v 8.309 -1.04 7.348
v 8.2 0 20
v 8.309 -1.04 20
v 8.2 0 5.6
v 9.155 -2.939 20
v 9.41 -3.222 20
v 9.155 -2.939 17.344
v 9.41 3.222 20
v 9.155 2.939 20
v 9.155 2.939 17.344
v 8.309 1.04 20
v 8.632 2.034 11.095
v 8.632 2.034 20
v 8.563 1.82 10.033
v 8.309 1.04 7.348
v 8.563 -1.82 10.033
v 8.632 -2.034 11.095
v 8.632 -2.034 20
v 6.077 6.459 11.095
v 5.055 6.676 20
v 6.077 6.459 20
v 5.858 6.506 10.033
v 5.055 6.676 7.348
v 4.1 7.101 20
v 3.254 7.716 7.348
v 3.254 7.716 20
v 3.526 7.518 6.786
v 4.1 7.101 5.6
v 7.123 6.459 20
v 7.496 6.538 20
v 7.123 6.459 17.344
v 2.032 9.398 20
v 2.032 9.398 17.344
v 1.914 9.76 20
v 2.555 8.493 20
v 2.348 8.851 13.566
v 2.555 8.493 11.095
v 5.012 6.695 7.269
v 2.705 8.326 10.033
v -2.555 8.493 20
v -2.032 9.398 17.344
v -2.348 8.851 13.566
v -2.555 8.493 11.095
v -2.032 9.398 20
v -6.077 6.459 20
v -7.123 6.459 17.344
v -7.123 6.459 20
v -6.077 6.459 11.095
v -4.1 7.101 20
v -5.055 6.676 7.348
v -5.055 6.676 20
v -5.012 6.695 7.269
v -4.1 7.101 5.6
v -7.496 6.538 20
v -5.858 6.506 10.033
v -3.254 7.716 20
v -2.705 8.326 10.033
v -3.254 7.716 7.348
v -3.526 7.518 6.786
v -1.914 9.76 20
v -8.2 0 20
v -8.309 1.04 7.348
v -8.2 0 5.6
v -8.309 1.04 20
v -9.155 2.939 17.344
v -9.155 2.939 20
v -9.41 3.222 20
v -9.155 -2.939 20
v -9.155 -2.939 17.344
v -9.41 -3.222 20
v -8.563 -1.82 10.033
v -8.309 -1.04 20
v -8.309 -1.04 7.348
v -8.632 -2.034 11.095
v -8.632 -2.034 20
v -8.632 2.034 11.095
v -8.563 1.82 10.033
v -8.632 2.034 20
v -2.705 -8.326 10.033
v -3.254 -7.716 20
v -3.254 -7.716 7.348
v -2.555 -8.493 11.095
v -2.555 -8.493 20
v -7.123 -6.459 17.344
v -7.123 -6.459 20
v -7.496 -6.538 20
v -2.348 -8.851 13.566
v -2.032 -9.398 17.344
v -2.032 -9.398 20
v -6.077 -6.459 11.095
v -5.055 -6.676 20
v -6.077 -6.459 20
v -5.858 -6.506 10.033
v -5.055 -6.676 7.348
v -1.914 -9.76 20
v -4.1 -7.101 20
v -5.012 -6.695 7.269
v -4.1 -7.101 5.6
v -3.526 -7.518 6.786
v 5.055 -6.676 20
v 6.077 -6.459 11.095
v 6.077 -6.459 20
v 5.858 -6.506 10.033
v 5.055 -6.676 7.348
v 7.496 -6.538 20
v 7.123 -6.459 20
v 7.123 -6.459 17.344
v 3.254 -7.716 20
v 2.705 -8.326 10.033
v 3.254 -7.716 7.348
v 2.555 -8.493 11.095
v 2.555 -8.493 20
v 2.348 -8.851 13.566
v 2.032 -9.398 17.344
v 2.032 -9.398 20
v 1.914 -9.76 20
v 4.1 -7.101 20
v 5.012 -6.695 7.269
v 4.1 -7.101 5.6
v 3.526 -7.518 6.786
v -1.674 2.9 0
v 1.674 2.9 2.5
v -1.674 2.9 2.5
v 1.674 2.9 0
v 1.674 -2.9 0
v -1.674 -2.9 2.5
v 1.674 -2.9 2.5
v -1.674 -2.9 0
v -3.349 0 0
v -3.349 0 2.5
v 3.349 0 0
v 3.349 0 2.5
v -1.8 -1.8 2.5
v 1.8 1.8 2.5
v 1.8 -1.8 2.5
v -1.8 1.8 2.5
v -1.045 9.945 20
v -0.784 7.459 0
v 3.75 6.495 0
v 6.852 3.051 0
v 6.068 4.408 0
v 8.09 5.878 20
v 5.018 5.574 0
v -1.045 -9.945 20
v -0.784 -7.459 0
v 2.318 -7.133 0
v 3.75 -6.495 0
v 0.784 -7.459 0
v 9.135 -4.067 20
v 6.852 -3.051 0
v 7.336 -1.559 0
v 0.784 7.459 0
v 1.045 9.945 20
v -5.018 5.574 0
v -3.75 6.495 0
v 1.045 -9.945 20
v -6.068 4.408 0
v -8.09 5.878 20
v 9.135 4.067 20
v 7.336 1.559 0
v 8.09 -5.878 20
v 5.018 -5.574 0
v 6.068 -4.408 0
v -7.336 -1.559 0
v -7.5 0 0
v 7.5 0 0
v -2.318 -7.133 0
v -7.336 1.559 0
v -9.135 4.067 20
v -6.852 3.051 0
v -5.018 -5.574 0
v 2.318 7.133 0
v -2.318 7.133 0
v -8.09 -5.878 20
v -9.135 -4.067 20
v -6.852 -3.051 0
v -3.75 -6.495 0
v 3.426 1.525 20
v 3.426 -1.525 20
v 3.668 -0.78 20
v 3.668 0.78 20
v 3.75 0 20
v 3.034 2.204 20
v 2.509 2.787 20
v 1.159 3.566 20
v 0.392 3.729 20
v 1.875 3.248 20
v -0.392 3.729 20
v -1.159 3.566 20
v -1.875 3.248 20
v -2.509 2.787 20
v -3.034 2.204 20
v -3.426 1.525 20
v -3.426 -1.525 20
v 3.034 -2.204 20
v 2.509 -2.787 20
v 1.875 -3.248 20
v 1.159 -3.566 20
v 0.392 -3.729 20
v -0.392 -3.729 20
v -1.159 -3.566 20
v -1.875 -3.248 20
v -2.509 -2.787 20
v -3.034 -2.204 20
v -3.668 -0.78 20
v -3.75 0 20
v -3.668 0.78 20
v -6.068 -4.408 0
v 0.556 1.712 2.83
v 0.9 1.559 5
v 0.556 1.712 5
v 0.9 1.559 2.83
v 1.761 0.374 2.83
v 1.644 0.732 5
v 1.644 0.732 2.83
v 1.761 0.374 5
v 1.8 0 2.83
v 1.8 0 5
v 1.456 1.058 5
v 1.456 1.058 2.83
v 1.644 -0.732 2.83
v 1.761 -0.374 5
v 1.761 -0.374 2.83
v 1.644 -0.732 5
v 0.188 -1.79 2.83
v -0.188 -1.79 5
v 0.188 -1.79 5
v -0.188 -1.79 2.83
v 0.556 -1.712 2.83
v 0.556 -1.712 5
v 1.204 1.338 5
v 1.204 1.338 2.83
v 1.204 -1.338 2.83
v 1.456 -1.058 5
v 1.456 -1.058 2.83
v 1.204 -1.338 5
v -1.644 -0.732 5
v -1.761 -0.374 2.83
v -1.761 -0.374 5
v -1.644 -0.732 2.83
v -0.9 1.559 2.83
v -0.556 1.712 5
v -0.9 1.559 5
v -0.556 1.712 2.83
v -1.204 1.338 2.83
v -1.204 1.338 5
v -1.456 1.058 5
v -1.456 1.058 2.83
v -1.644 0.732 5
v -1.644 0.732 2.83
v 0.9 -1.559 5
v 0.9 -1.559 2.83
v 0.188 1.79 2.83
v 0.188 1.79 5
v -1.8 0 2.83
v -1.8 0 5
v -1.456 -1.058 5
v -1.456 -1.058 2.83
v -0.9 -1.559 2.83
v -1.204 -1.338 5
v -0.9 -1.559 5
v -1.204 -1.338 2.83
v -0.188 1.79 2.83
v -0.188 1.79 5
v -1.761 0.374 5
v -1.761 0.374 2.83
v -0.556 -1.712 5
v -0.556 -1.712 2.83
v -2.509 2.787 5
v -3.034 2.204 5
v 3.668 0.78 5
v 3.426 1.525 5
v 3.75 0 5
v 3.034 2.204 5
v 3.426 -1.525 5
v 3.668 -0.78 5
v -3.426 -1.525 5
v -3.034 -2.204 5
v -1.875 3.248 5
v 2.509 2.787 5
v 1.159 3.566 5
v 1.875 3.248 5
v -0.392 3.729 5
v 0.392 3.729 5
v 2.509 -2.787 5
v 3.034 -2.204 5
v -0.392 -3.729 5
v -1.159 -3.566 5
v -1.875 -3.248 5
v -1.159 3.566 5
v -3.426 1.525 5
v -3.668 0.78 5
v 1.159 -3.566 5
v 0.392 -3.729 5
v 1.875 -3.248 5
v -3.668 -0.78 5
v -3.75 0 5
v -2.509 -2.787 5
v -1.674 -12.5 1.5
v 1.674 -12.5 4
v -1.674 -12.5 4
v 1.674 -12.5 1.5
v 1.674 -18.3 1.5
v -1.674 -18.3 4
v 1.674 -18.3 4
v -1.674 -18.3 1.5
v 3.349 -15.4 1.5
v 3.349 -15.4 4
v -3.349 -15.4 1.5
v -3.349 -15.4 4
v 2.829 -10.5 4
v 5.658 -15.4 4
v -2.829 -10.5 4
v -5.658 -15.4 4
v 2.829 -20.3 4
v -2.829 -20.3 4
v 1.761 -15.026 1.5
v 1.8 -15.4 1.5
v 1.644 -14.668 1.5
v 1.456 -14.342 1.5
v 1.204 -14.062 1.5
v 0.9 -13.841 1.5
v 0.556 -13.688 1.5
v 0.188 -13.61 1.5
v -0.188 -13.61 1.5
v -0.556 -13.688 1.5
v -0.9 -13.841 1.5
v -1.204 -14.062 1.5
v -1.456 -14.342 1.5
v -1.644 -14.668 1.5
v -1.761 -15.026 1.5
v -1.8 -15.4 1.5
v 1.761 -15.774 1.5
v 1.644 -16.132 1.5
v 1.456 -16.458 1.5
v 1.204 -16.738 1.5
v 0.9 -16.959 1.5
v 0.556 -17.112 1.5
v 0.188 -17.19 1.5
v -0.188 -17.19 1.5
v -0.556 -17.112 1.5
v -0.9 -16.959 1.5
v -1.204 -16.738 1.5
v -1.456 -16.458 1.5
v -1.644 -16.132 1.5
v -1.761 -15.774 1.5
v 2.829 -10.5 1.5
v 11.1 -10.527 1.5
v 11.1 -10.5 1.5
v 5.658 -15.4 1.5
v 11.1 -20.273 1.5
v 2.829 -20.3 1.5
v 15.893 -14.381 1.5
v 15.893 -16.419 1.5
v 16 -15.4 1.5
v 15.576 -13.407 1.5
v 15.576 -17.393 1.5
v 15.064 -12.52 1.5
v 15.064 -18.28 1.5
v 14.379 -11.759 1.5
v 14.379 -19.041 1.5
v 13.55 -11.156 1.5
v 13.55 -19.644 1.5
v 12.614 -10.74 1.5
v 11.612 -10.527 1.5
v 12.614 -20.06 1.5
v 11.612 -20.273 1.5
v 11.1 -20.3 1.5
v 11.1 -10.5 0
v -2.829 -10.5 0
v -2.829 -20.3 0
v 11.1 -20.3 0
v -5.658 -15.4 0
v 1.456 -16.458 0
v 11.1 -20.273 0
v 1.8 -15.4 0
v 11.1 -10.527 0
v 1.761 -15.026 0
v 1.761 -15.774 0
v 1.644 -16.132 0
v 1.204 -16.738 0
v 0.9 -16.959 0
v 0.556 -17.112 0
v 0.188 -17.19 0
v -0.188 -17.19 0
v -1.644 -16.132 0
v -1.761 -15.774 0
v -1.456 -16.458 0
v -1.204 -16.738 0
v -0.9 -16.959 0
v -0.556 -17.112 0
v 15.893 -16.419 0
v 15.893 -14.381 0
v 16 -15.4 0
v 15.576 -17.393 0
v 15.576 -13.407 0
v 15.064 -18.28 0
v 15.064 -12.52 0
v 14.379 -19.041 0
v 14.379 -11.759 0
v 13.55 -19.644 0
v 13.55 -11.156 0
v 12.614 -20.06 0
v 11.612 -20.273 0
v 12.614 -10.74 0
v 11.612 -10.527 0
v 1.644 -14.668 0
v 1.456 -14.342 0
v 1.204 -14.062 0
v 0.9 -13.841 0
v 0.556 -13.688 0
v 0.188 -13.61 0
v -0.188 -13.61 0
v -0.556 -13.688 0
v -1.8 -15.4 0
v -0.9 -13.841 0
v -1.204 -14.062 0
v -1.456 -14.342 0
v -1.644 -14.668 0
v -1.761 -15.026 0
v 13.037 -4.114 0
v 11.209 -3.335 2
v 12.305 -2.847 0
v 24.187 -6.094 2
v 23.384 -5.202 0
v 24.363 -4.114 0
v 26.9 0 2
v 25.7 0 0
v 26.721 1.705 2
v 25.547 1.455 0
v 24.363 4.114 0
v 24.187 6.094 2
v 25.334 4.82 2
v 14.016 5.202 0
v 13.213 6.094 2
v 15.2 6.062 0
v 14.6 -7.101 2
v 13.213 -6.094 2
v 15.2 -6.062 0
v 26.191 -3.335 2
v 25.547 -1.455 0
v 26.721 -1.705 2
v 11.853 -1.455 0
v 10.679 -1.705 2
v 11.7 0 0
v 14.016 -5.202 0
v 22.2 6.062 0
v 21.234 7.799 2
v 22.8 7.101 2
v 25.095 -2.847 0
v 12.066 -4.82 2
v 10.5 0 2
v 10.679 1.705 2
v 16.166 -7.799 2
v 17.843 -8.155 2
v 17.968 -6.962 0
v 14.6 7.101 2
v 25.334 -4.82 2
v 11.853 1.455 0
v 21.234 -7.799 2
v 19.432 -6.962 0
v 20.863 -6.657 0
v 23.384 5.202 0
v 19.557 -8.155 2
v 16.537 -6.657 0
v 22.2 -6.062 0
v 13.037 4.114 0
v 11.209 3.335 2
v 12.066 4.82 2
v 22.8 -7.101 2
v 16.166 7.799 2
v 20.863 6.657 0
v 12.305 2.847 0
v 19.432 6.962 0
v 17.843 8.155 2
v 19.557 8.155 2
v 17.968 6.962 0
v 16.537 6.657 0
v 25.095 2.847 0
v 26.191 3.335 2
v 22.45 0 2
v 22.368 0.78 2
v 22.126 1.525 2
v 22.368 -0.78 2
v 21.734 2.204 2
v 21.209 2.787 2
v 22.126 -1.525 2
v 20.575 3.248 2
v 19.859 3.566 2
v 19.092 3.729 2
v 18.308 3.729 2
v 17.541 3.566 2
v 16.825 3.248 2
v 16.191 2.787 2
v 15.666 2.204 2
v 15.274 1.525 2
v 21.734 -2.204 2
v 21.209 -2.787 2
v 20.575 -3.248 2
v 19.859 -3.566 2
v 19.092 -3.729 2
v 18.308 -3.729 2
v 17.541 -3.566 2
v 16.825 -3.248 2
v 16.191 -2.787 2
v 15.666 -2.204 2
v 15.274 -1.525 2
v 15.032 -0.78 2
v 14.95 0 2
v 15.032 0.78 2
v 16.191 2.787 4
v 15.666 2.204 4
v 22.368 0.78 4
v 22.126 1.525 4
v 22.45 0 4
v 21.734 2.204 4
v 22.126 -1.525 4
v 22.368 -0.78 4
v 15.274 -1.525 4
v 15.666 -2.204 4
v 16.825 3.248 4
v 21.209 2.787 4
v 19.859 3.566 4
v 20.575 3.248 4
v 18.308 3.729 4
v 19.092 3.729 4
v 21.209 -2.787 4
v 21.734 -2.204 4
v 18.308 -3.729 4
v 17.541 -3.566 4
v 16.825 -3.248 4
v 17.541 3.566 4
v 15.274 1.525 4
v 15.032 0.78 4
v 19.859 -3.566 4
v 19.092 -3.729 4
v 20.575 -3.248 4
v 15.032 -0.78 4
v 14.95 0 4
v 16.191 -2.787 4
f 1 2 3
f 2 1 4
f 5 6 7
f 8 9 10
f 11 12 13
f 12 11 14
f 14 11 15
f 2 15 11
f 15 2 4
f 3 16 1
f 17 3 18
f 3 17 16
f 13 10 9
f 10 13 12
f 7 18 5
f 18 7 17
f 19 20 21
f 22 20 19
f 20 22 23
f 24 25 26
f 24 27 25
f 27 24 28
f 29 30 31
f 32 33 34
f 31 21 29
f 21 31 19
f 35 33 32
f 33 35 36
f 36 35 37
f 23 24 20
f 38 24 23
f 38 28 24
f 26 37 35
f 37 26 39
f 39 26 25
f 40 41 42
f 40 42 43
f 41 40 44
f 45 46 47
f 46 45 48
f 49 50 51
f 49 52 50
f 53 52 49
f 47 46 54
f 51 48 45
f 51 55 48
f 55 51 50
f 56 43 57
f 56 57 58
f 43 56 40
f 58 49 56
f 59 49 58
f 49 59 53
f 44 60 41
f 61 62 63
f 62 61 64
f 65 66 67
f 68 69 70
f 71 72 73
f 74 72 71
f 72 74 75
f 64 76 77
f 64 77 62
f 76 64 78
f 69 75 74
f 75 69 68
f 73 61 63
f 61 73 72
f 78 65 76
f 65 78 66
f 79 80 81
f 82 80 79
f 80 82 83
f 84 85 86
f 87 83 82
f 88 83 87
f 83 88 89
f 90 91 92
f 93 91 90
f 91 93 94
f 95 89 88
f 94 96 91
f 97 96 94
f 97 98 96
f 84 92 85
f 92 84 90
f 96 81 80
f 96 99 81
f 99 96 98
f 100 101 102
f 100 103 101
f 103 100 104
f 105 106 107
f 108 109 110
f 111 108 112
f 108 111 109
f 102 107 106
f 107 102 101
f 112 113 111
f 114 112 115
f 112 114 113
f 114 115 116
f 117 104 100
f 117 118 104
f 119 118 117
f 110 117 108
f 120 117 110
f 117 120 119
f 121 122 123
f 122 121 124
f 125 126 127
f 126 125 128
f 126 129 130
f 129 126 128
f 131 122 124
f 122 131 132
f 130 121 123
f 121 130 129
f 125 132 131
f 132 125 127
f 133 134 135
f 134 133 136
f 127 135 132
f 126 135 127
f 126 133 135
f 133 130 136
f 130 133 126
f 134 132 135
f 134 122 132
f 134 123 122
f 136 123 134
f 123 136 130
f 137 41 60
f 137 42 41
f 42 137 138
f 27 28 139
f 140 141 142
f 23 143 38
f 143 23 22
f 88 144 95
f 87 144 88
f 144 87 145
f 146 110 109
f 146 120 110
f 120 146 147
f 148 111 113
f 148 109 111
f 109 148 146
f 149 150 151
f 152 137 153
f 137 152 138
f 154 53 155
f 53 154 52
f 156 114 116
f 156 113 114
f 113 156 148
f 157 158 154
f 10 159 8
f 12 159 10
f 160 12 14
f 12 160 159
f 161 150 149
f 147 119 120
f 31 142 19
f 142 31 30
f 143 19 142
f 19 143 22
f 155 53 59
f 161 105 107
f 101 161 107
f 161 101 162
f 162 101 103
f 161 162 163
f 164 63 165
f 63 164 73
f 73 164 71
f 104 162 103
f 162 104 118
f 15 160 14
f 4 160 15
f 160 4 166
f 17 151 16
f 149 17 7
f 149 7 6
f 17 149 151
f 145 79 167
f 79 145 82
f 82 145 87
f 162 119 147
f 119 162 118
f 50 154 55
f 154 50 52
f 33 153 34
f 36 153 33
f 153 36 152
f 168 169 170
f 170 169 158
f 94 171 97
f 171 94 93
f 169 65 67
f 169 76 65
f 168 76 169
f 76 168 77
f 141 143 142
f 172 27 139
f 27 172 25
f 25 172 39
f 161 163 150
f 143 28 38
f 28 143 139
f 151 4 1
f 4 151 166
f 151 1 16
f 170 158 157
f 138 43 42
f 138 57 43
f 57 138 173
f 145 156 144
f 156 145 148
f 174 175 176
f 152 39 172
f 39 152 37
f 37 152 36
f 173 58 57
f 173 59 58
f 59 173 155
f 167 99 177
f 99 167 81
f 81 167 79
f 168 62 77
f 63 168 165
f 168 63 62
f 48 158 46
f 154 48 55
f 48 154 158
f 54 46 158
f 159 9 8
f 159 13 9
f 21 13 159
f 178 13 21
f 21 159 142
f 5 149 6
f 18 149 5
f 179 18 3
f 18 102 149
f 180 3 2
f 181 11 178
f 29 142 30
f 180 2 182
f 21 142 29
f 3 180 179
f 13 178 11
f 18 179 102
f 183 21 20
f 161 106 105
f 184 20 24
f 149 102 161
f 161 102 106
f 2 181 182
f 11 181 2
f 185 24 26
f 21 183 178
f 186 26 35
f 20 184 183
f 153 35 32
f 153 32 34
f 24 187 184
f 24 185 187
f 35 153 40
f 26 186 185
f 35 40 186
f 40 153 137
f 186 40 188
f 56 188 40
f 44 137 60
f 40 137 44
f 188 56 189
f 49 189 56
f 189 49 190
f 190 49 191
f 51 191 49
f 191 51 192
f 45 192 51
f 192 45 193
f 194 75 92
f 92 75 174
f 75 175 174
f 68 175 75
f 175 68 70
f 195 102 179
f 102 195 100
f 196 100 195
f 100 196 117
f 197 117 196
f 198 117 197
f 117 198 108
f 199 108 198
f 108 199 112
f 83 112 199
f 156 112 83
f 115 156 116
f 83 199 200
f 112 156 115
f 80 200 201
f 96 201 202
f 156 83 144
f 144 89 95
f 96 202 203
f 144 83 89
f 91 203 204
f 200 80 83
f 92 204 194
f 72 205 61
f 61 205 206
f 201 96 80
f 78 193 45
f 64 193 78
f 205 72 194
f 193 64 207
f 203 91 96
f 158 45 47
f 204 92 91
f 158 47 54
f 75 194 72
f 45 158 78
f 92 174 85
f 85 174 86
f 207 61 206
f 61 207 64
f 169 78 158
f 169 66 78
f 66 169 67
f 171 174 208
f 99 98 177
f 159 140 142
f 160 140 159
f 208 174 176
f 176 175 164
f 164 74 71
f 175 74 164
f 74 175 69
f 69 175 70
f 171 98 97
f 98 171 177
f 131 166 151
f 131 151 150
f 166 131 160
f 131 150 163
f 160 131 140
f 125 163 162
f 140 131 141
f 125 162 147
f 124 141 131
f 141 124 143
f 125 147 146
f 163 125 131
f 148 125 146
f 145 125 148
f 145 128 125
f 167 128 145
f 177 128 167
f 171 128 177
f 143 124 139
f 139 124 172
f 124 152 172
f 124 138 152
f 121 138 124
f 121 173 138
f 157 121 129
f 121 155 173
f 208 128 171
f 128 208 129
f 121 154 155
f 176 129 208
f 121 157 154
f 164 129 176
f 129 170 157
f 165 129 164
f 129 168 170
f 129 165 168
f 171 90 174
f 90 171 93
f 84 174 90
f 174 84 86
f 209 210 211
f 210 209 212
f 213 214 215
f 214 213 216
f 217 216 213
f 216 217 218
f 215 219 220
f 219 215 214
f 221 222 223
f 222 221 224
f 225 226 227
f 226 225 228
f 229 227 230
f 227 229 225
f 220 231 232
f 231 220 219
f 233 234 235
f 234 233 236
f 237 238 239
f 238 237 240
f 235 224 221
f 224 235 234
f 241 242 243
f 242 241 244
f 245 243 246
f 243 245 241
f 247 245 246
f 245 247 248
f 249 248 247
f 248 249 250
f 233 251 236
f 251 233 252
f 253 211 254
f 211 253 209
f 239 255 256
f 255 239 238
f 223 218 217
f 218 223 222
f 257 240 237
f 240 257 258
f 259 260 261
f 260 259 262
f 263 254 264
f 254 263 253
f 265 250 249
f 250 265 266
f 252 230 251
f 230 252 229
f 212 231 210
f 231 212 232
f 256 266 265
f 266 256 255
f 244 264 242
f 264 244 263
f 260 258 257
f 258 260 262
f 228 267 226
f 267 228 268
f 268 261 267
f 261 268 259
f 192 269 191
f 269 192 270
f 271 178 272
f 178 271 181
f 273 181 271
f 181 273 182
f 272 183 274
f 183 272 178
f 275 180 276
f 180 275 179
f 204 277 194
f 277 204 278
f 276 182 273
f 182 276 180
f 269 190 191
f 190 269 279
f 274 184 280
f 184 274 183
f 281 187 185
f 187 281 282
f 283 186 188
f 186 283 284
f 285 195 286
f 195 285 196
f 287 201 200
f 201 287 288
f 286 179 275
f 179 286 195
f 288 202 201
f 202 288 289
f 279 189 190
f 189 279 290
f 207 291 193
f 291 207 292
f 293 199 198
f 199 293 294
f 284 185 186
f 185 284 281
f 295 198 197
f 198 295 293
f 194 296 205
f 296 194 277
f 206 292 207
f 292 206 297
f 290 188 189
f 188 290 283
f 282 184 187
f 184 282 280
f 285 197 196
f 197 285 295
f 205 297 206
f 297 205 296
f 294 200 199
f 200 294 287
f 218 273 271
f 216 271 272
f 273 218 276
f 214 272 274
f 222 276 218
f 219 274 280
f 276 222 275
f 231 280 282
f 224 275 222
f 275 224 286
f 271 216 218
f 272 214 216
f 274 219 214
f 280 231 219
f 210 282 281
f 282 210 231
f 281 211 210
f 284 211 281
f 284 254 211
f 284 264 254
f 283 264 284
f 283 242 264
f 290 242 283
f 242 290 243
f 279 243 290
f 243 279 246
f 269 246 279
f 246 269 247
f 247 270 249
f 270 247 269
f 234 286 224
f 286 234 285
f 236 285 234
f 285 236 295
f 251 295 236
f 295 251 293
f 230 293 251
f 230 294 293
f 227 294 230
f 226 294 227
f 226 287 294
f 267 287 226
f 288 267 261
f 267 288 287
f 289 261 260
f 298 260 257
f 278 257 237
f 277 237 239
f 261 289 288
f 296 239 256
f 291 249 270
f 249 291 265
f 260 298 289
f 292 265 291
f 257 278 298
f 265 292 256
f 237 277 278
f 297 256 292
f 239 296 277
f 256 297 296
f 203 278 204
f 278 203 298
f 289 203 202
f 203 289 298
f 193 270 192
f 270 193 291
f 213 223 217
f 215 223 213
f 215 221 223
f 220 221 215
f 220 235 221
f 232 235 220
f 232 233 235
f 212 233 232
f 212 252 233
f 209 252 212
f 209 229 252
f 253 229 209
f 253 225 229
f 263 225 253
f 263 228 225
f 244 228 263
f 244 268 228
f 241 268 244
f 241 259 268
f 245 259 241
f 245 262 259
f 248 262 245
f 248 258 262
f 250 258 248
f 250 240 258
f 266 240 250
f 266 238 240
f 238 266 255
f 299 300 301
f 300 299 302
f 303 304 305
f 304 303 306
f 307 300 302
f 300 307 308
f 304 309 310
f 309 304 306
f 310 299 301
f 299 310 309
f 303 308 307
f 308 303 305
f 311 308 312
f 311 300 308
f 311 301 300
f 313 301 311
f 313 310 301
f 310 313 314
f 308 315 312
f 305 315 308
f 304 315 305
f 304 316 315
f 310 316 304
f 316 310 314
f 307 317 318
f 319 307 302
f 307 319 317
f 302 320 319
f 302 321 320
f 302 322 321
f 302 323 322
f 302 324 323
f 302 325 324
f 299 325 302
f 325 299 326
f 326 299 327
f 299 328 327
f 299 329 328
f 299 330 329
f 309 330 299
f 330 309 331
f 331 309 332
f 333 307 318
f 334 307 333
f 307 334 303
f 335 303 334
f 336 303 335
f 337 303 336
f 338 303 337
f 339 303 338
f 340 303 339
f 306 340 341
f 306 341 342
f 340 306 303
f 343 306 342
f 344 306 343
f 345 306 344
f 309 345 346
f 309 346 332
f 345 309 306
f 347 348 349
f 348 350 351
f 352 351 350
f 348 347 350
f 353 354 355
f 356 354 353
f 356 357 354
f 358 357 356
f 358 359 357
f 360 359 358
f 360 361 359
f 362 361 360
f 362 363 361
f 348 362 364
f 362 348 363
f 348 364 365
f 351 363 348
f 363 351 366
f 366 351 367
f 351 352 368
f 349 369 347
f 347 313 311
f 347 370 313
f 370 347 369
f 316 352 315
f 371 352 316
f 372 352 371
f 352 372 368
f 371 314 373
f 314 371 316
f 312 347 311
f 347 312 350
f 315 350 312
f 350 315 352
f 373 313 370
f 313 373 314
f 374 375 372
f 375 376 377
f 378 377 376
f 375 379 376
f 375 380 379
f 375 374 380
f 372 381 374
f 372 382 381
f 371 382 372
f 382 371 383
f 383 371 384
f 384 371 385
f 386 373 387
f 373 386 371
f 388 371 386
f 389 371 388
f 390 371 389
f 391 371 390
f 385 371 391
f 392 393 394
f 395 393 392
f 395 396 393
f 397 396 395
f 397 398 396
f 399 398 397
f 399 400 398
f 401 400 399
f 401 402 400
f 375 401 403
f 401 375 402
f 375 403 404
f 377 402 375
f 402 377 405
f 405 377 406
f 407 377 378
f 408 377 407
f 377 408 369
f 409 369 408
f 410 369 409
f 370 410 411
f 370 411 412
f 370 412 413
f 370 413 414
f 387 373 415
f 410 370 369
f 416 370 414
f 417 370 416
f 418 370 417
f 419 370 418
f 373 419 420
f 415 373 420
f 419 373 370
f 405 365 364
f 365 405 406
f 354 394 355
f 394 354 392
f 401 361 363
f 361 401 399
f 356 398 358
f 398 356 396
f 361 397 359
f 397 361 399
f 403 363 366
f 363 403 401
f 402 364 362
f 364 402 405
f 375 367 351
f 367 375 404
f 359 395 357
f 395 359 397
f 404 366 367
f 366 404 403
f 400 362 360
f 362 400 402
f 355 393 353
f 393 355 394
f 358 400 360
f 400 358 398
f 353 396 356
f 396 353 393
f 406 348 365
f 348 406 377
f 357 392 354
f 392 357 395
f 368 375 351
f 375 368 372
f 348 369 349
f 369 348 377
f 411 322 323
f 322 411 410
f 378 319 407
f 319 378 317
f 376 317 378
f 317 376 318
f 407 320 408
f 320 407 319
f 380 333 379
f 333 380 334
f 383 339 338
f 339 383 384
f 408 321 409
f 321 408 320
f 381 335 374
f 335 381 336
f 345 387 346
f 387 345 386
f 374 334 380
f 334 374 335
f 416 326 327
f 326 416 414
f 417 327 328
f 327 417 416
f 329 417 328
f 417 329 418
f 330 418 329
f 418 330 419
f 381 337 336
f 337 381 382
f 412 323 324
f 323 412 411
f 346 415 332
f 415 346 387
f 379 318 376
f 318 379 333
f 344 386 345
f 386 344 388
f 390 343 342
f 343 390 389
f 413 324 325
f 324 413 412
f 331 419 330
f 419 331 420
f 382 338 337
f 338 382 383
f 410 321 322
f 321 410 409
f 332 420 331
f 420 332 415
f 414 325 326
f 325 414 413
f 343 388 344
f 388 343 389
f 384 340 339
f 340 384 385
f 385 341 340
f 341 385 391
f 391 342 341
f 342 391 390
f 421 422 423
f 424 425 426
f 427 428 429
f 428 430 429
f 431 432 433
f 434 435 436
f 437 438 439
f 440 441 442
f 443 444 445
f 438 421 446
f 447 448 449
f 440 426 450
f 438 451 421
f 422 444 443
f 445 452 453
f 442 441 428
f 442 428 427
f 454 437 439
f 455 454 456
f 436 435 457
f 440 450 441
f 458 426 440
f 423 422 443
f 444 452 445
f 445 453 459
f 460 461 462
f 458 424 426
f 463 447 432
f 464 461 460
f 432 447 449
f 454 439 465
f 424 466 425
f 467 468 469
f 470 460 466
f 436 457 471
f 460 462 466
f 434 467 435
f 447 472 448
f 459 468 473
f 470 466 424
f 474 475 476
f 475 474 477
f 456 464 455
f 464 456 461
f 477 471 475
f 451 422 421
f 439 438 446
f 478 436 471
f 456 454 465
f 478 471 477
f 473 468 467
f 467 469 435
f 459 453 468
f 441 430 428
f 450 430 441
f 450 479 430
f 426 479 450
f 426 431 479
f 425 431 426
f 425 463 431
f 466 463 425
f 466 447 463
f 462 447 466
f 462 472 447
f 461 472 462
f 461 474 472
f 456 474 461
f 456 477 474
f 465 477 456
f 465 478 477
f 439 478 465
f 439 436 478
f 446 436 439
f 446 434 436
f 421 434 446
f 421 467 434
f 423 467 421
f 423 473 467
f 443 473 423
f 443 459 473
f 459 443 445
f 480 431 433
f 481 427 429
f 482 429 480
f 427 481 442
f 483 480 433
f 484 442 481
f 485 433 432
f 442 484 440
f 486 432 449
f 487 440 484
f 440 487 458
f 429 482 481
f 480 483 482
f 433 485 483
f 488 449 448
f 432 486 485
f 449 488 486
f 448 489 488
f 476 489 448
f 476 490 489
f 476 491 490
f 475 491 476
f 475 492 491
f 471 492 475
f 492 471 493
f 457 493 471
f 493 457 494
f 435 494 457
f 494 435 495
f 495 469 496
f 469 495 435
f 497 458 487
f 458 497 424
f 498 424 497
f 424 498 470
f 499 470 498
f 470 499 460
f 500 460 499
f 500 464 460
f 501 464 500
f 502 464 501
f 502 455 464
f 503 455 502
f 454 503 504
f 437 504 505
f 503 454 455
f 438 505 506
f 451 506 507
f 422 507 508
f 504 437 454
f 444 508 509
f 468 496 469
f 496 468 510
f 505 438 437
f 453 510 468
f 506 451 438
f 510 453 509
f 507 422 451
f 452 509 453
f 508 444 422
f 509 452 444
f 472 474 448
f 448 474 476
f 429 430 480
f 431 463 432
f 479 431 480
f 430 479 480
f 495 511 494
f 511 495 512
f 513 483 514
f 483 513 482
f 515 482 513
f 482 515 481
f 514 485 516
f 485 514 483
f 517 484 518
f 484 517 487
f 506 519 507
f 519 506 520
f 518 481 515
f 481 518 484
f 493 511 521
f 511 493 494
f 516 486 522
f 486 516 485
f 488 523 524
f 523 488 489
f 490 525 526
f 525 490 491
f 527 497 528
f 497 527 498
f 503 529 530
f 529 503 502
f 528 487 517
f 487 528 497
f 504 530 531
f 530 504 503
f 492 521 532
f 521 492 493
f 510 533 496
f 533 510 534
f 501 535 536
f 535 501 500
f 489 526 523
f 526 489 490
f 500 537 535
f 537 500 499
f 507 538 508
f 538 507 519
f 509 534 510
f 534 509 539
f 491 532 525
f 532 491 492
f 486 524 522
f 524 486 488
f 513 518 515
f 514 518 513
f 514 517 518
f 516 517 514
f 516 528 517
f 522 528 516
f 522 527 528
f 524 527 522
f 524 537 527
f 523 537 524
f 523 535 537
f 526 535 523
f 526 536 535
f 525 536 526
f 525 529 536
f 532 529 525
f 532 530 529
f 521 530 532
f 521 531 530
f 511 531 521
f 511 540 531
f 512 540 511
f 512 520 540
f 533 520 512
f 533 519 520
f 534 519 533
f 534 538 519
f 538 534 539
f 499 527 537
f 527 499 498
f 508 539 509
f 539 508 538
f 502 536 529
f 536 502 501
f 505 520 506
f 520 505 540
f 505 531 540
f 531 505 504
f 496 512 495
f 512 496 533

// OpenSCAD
/*
 * Knob with Latch, v0.42
 *
 * by Alex Franke (CodeCreations), Jan 2013
 * http://www.theFrankes.com
 * 
 * Licenced under Creative Commons Attribution - Non-Commercial - Share Alike 3.0 
 * 
 * DESCRIPTION: This is a parametric knob with hole cover and latch. The latch is meant to hold 
 *   a door or drawer from the back so it doesn't pull out or open. The latch is engaged or 
 *   released by turning the knob. 
 * 
 * INSTRUCTIONS: Edit the "User-defined values" section to meet your needs. Check the echo output 
 *   (rendering output) for the minimum screw length required. Insert a screw through the top of 
 *   the knob, and screw a nut onto the end. Tighten the screw until the nut is brought up into 
 *   the knob and locks into place. Insert the exposed threaded screw through the material you're 
 *   attaching the knob to. Add the latch over the end of the screw with the nut trap facing out. 
 *   Add a nut and turn the the knob until the nut is brought into the latch. Add another nut 
 *   and tighten it down against the previously added nut to lock the latch into place. Place the 
 *   cap over the screw hole in the front of the knob and snap into place. 
 * 
 * VIDEO: http://www.youtube.com/watch?v=ZVg8XCQSZRU 
 * 
 * v0.42, Jan 1, 2013: Initial Release.
 * 
 * TODO: 
 *   * Fix OpenSCAD silliness so you don't have to run it through netfabb 
 */


/////////////////////////////////////////////////////////////////////////////
// User-defined values... 
/////////////////////////////////////////////////////////////////////////////

// Optional parameters that do not affect the rendered model
boardWidth             = 18;   // Used only for calculating minimum screw length

// Printer capabilities 
layerHeight            = 0.33; // Layer height for hole support material, or zero for none

// Hardware parameters 
holeDiameter           = 3.6;  // Diameter of clearance hole. M3=3
screwHeadDiameter      = 7.5;  // Diameter of the head of the screw. M3=6.7 
nutInDiameter          = 5.8;  // Flat-to-flat diameter of the nuts. M3=5.5 
nutHeight              = 2.5;  // Height or thickness of the nuts. M3=2.5

// Knob parameters 
knobBaseDiameter       = 15;   // Diameter of the base of the knob
knobTopDiameter        = 20;   // Diameter of the top of the knob
knobHeight             = 20;   // Total height of the knob (not including the cap) 
burlDiameter           = 10;   // Diameter of the burl cut-outs
burlInset              = 1.8;  // Distance the burl cut-outs are inset into the knob
screwHeadDepth         = 15;   // Depth of the screw head inside the knob

// Knob cap parameters 
knobCapTopDiameter     = 14;   // Top diameter of the knob cap 
knobCapHeight          = 2;    // Total height of the knob cap 
knobCapInsertionLength = 2;    // Insertion depth of the knob cap 

// Latch parameters 
latchThickness         = 1.5;  // Thickness of the latch material 
latchLength            = 16;   // Length of the latch, measured from the center of the hole
nutPadding             = 2;    // Width of material surrounding the nut on the latch

// Rendering parameters
printSeparation        = 3;    // Distance to separate rendered objects 
$fn                    = 30;   // General curve quality


/////////////////////////////////////////////////////////////////////////////
// The code... 
/////////////////////////////////////////////////////////////////////////////

// echo out required screw length 
echo( str("Screw length of at least ", knobHeight-screwHeadDepth+boardWidth
	+latchThickness+2*nutHeight, "mm required.") ); 

outerNutInDiameter = nutInDiameter+2*nutPadding; 

// Render Knob
knob();

// Render Latch
translate([0,-(knobBaseDiameter+outerNutInDiameter)/2-printSeparation,0]) 
	latch(); 

// Render Knob Cap
translate([knobBaseDiameter/2+max(knobCapTopDiameter/2,knobTopDiameter/2-burlInset)+printSeparation,0]) 
	knobCap(); 


/////////////////////////////////////////////////////////////////////////////
// Modules... 
/////////////////////////////////////////////////////////////////////////////

module knobCap() {
	union() {
		cylinder( r1=knobCapTopDiameter/2, r2=knobTopDiameter/2-burlInset, h=knobCapHeight);
		translate([0,0,knobCapHeight]) 
			cylinder(r=screwHeadDiameter/2, h=knobCapInsertionLength);
	}
}

module latch() {
	
	difference() {
		union() {
			translate([0,0,nutHeight/2+latchThickness]) 
				difference() {
					nut([outerNutInDiameter,nutHeight]);
					nut([nutInDiameter,nutHeight+1]);
				}
	
			translate([0,0,latchThickness/2]) 
				nut([outerNutInDiameter,latchThickness]);
	
			translate([latchLength/2,0,latchThickness/2]) 
				rotate([0,0,180]) 
					stick([latchLength,outerNutInDiameter,latchThickness], 1);
		}
	
		translate([0,0,-0.5]) 
			cylinder(h=latchThickness+nutHeight+1,r=holeDiameter/2);
	}

}

module knob() {

	if (knobHeight-screwHeadDepth-nutHeight < latchThickness) 
		echo("WARNING: Screw hole might be too deep!");

	union() {
		difference() {
			
			cylinder( r1=knobBaseDiameter/2, r2=knobTopDiameter/2, h=knobHeight);
	
			for ( i = [0 : 5] ) {
			   	rotate( [0,0, i*(360/6)])
					translate([(knobTopDiameter+burlDiameter)/2-burlInset,0,-0.5]) 
					   	cylinder( r=burlDiameter/2, h=knobHeight+1 );
			}
	
			translate([0,0,nutHeight/2 - 0.5]) 
				nut([nutInDiameter,nutHeight + 0.5]);	
	
			translate([0,0,nutHeight/2 - 0.5]) 
				cylinder(h=knobHeight-3, r=holeDiameter/2);	
	
	
			// Through hole 
			translate([0,0,-0.5]) 
				cylinder(h=knobHeight+1, r=holeDiameter/2);	
	
			// Screw head 
			translate([0,0,knobHeight-screwHeadDepth]) 
				cylinder(h=screwHeadDepth+1, r=screwHeadDiameter/2);	
	
			// Knob nut
			translate([0,0,(nutHeight+1)/2-1]) 
				nut([nutInDiameter,nutHeight+1]);
			
		}

		// support material to drill out. 
		translate([0,0,nutHeight+layerHeight/2]) 
			cube([holeDiameter,holeDiameter, layerHeight], center=true); 
	}
	
}

// My nutty nut code. nutSize = [inDiameter,thickness]
module nut( nutSize ) { 
	side = nutSize[0] * tan( 180/6 );
	if ( nutSize[0] * nutSize[1] != 0 ) {
		for ( i = [0 : 2] ) {
			rotate( i*120, [0, 0, 1]) 
				cube( [side, nutSize[0], nutSize[1]], center=true );
		}
	}
}

// Makes a stick with 0, 1, or 2 rounded ends, and optionally centered on the 
// circle center of one end. 
module stick( stickSize, numRounds, centerCircle=false ) {

	assign( dist = (stickSize[0]-stickSize[1])/2 )
	translate([centerCircle?dist:0,0,0]) 
	union() {
		for ( i=[-1,1] )
			translate([ i*dist, 0, 0 ]){
				cylinder( r=stickSize[1]/2, h=stickSize[2], center=true );
		}	
		cube(stickSize + [-stickSize[1],0,0], center=true);
		if ( numRounds < 2 ) 
			translate([ stickSize[0]/2 - stickSize[1]/4, 0, 0 ])
				cube([stickSize[1]/2,stickSize[1],stickSize[2]], center=true);
		if ( numRounds < 1 ) 
			translate([ -stickSize[0]/2 + stickSize[1]/4, 0, 0 ])
				cube([stickSize[1]/2,stickSize[1],stickSize[2]], center=true);
	}
}
